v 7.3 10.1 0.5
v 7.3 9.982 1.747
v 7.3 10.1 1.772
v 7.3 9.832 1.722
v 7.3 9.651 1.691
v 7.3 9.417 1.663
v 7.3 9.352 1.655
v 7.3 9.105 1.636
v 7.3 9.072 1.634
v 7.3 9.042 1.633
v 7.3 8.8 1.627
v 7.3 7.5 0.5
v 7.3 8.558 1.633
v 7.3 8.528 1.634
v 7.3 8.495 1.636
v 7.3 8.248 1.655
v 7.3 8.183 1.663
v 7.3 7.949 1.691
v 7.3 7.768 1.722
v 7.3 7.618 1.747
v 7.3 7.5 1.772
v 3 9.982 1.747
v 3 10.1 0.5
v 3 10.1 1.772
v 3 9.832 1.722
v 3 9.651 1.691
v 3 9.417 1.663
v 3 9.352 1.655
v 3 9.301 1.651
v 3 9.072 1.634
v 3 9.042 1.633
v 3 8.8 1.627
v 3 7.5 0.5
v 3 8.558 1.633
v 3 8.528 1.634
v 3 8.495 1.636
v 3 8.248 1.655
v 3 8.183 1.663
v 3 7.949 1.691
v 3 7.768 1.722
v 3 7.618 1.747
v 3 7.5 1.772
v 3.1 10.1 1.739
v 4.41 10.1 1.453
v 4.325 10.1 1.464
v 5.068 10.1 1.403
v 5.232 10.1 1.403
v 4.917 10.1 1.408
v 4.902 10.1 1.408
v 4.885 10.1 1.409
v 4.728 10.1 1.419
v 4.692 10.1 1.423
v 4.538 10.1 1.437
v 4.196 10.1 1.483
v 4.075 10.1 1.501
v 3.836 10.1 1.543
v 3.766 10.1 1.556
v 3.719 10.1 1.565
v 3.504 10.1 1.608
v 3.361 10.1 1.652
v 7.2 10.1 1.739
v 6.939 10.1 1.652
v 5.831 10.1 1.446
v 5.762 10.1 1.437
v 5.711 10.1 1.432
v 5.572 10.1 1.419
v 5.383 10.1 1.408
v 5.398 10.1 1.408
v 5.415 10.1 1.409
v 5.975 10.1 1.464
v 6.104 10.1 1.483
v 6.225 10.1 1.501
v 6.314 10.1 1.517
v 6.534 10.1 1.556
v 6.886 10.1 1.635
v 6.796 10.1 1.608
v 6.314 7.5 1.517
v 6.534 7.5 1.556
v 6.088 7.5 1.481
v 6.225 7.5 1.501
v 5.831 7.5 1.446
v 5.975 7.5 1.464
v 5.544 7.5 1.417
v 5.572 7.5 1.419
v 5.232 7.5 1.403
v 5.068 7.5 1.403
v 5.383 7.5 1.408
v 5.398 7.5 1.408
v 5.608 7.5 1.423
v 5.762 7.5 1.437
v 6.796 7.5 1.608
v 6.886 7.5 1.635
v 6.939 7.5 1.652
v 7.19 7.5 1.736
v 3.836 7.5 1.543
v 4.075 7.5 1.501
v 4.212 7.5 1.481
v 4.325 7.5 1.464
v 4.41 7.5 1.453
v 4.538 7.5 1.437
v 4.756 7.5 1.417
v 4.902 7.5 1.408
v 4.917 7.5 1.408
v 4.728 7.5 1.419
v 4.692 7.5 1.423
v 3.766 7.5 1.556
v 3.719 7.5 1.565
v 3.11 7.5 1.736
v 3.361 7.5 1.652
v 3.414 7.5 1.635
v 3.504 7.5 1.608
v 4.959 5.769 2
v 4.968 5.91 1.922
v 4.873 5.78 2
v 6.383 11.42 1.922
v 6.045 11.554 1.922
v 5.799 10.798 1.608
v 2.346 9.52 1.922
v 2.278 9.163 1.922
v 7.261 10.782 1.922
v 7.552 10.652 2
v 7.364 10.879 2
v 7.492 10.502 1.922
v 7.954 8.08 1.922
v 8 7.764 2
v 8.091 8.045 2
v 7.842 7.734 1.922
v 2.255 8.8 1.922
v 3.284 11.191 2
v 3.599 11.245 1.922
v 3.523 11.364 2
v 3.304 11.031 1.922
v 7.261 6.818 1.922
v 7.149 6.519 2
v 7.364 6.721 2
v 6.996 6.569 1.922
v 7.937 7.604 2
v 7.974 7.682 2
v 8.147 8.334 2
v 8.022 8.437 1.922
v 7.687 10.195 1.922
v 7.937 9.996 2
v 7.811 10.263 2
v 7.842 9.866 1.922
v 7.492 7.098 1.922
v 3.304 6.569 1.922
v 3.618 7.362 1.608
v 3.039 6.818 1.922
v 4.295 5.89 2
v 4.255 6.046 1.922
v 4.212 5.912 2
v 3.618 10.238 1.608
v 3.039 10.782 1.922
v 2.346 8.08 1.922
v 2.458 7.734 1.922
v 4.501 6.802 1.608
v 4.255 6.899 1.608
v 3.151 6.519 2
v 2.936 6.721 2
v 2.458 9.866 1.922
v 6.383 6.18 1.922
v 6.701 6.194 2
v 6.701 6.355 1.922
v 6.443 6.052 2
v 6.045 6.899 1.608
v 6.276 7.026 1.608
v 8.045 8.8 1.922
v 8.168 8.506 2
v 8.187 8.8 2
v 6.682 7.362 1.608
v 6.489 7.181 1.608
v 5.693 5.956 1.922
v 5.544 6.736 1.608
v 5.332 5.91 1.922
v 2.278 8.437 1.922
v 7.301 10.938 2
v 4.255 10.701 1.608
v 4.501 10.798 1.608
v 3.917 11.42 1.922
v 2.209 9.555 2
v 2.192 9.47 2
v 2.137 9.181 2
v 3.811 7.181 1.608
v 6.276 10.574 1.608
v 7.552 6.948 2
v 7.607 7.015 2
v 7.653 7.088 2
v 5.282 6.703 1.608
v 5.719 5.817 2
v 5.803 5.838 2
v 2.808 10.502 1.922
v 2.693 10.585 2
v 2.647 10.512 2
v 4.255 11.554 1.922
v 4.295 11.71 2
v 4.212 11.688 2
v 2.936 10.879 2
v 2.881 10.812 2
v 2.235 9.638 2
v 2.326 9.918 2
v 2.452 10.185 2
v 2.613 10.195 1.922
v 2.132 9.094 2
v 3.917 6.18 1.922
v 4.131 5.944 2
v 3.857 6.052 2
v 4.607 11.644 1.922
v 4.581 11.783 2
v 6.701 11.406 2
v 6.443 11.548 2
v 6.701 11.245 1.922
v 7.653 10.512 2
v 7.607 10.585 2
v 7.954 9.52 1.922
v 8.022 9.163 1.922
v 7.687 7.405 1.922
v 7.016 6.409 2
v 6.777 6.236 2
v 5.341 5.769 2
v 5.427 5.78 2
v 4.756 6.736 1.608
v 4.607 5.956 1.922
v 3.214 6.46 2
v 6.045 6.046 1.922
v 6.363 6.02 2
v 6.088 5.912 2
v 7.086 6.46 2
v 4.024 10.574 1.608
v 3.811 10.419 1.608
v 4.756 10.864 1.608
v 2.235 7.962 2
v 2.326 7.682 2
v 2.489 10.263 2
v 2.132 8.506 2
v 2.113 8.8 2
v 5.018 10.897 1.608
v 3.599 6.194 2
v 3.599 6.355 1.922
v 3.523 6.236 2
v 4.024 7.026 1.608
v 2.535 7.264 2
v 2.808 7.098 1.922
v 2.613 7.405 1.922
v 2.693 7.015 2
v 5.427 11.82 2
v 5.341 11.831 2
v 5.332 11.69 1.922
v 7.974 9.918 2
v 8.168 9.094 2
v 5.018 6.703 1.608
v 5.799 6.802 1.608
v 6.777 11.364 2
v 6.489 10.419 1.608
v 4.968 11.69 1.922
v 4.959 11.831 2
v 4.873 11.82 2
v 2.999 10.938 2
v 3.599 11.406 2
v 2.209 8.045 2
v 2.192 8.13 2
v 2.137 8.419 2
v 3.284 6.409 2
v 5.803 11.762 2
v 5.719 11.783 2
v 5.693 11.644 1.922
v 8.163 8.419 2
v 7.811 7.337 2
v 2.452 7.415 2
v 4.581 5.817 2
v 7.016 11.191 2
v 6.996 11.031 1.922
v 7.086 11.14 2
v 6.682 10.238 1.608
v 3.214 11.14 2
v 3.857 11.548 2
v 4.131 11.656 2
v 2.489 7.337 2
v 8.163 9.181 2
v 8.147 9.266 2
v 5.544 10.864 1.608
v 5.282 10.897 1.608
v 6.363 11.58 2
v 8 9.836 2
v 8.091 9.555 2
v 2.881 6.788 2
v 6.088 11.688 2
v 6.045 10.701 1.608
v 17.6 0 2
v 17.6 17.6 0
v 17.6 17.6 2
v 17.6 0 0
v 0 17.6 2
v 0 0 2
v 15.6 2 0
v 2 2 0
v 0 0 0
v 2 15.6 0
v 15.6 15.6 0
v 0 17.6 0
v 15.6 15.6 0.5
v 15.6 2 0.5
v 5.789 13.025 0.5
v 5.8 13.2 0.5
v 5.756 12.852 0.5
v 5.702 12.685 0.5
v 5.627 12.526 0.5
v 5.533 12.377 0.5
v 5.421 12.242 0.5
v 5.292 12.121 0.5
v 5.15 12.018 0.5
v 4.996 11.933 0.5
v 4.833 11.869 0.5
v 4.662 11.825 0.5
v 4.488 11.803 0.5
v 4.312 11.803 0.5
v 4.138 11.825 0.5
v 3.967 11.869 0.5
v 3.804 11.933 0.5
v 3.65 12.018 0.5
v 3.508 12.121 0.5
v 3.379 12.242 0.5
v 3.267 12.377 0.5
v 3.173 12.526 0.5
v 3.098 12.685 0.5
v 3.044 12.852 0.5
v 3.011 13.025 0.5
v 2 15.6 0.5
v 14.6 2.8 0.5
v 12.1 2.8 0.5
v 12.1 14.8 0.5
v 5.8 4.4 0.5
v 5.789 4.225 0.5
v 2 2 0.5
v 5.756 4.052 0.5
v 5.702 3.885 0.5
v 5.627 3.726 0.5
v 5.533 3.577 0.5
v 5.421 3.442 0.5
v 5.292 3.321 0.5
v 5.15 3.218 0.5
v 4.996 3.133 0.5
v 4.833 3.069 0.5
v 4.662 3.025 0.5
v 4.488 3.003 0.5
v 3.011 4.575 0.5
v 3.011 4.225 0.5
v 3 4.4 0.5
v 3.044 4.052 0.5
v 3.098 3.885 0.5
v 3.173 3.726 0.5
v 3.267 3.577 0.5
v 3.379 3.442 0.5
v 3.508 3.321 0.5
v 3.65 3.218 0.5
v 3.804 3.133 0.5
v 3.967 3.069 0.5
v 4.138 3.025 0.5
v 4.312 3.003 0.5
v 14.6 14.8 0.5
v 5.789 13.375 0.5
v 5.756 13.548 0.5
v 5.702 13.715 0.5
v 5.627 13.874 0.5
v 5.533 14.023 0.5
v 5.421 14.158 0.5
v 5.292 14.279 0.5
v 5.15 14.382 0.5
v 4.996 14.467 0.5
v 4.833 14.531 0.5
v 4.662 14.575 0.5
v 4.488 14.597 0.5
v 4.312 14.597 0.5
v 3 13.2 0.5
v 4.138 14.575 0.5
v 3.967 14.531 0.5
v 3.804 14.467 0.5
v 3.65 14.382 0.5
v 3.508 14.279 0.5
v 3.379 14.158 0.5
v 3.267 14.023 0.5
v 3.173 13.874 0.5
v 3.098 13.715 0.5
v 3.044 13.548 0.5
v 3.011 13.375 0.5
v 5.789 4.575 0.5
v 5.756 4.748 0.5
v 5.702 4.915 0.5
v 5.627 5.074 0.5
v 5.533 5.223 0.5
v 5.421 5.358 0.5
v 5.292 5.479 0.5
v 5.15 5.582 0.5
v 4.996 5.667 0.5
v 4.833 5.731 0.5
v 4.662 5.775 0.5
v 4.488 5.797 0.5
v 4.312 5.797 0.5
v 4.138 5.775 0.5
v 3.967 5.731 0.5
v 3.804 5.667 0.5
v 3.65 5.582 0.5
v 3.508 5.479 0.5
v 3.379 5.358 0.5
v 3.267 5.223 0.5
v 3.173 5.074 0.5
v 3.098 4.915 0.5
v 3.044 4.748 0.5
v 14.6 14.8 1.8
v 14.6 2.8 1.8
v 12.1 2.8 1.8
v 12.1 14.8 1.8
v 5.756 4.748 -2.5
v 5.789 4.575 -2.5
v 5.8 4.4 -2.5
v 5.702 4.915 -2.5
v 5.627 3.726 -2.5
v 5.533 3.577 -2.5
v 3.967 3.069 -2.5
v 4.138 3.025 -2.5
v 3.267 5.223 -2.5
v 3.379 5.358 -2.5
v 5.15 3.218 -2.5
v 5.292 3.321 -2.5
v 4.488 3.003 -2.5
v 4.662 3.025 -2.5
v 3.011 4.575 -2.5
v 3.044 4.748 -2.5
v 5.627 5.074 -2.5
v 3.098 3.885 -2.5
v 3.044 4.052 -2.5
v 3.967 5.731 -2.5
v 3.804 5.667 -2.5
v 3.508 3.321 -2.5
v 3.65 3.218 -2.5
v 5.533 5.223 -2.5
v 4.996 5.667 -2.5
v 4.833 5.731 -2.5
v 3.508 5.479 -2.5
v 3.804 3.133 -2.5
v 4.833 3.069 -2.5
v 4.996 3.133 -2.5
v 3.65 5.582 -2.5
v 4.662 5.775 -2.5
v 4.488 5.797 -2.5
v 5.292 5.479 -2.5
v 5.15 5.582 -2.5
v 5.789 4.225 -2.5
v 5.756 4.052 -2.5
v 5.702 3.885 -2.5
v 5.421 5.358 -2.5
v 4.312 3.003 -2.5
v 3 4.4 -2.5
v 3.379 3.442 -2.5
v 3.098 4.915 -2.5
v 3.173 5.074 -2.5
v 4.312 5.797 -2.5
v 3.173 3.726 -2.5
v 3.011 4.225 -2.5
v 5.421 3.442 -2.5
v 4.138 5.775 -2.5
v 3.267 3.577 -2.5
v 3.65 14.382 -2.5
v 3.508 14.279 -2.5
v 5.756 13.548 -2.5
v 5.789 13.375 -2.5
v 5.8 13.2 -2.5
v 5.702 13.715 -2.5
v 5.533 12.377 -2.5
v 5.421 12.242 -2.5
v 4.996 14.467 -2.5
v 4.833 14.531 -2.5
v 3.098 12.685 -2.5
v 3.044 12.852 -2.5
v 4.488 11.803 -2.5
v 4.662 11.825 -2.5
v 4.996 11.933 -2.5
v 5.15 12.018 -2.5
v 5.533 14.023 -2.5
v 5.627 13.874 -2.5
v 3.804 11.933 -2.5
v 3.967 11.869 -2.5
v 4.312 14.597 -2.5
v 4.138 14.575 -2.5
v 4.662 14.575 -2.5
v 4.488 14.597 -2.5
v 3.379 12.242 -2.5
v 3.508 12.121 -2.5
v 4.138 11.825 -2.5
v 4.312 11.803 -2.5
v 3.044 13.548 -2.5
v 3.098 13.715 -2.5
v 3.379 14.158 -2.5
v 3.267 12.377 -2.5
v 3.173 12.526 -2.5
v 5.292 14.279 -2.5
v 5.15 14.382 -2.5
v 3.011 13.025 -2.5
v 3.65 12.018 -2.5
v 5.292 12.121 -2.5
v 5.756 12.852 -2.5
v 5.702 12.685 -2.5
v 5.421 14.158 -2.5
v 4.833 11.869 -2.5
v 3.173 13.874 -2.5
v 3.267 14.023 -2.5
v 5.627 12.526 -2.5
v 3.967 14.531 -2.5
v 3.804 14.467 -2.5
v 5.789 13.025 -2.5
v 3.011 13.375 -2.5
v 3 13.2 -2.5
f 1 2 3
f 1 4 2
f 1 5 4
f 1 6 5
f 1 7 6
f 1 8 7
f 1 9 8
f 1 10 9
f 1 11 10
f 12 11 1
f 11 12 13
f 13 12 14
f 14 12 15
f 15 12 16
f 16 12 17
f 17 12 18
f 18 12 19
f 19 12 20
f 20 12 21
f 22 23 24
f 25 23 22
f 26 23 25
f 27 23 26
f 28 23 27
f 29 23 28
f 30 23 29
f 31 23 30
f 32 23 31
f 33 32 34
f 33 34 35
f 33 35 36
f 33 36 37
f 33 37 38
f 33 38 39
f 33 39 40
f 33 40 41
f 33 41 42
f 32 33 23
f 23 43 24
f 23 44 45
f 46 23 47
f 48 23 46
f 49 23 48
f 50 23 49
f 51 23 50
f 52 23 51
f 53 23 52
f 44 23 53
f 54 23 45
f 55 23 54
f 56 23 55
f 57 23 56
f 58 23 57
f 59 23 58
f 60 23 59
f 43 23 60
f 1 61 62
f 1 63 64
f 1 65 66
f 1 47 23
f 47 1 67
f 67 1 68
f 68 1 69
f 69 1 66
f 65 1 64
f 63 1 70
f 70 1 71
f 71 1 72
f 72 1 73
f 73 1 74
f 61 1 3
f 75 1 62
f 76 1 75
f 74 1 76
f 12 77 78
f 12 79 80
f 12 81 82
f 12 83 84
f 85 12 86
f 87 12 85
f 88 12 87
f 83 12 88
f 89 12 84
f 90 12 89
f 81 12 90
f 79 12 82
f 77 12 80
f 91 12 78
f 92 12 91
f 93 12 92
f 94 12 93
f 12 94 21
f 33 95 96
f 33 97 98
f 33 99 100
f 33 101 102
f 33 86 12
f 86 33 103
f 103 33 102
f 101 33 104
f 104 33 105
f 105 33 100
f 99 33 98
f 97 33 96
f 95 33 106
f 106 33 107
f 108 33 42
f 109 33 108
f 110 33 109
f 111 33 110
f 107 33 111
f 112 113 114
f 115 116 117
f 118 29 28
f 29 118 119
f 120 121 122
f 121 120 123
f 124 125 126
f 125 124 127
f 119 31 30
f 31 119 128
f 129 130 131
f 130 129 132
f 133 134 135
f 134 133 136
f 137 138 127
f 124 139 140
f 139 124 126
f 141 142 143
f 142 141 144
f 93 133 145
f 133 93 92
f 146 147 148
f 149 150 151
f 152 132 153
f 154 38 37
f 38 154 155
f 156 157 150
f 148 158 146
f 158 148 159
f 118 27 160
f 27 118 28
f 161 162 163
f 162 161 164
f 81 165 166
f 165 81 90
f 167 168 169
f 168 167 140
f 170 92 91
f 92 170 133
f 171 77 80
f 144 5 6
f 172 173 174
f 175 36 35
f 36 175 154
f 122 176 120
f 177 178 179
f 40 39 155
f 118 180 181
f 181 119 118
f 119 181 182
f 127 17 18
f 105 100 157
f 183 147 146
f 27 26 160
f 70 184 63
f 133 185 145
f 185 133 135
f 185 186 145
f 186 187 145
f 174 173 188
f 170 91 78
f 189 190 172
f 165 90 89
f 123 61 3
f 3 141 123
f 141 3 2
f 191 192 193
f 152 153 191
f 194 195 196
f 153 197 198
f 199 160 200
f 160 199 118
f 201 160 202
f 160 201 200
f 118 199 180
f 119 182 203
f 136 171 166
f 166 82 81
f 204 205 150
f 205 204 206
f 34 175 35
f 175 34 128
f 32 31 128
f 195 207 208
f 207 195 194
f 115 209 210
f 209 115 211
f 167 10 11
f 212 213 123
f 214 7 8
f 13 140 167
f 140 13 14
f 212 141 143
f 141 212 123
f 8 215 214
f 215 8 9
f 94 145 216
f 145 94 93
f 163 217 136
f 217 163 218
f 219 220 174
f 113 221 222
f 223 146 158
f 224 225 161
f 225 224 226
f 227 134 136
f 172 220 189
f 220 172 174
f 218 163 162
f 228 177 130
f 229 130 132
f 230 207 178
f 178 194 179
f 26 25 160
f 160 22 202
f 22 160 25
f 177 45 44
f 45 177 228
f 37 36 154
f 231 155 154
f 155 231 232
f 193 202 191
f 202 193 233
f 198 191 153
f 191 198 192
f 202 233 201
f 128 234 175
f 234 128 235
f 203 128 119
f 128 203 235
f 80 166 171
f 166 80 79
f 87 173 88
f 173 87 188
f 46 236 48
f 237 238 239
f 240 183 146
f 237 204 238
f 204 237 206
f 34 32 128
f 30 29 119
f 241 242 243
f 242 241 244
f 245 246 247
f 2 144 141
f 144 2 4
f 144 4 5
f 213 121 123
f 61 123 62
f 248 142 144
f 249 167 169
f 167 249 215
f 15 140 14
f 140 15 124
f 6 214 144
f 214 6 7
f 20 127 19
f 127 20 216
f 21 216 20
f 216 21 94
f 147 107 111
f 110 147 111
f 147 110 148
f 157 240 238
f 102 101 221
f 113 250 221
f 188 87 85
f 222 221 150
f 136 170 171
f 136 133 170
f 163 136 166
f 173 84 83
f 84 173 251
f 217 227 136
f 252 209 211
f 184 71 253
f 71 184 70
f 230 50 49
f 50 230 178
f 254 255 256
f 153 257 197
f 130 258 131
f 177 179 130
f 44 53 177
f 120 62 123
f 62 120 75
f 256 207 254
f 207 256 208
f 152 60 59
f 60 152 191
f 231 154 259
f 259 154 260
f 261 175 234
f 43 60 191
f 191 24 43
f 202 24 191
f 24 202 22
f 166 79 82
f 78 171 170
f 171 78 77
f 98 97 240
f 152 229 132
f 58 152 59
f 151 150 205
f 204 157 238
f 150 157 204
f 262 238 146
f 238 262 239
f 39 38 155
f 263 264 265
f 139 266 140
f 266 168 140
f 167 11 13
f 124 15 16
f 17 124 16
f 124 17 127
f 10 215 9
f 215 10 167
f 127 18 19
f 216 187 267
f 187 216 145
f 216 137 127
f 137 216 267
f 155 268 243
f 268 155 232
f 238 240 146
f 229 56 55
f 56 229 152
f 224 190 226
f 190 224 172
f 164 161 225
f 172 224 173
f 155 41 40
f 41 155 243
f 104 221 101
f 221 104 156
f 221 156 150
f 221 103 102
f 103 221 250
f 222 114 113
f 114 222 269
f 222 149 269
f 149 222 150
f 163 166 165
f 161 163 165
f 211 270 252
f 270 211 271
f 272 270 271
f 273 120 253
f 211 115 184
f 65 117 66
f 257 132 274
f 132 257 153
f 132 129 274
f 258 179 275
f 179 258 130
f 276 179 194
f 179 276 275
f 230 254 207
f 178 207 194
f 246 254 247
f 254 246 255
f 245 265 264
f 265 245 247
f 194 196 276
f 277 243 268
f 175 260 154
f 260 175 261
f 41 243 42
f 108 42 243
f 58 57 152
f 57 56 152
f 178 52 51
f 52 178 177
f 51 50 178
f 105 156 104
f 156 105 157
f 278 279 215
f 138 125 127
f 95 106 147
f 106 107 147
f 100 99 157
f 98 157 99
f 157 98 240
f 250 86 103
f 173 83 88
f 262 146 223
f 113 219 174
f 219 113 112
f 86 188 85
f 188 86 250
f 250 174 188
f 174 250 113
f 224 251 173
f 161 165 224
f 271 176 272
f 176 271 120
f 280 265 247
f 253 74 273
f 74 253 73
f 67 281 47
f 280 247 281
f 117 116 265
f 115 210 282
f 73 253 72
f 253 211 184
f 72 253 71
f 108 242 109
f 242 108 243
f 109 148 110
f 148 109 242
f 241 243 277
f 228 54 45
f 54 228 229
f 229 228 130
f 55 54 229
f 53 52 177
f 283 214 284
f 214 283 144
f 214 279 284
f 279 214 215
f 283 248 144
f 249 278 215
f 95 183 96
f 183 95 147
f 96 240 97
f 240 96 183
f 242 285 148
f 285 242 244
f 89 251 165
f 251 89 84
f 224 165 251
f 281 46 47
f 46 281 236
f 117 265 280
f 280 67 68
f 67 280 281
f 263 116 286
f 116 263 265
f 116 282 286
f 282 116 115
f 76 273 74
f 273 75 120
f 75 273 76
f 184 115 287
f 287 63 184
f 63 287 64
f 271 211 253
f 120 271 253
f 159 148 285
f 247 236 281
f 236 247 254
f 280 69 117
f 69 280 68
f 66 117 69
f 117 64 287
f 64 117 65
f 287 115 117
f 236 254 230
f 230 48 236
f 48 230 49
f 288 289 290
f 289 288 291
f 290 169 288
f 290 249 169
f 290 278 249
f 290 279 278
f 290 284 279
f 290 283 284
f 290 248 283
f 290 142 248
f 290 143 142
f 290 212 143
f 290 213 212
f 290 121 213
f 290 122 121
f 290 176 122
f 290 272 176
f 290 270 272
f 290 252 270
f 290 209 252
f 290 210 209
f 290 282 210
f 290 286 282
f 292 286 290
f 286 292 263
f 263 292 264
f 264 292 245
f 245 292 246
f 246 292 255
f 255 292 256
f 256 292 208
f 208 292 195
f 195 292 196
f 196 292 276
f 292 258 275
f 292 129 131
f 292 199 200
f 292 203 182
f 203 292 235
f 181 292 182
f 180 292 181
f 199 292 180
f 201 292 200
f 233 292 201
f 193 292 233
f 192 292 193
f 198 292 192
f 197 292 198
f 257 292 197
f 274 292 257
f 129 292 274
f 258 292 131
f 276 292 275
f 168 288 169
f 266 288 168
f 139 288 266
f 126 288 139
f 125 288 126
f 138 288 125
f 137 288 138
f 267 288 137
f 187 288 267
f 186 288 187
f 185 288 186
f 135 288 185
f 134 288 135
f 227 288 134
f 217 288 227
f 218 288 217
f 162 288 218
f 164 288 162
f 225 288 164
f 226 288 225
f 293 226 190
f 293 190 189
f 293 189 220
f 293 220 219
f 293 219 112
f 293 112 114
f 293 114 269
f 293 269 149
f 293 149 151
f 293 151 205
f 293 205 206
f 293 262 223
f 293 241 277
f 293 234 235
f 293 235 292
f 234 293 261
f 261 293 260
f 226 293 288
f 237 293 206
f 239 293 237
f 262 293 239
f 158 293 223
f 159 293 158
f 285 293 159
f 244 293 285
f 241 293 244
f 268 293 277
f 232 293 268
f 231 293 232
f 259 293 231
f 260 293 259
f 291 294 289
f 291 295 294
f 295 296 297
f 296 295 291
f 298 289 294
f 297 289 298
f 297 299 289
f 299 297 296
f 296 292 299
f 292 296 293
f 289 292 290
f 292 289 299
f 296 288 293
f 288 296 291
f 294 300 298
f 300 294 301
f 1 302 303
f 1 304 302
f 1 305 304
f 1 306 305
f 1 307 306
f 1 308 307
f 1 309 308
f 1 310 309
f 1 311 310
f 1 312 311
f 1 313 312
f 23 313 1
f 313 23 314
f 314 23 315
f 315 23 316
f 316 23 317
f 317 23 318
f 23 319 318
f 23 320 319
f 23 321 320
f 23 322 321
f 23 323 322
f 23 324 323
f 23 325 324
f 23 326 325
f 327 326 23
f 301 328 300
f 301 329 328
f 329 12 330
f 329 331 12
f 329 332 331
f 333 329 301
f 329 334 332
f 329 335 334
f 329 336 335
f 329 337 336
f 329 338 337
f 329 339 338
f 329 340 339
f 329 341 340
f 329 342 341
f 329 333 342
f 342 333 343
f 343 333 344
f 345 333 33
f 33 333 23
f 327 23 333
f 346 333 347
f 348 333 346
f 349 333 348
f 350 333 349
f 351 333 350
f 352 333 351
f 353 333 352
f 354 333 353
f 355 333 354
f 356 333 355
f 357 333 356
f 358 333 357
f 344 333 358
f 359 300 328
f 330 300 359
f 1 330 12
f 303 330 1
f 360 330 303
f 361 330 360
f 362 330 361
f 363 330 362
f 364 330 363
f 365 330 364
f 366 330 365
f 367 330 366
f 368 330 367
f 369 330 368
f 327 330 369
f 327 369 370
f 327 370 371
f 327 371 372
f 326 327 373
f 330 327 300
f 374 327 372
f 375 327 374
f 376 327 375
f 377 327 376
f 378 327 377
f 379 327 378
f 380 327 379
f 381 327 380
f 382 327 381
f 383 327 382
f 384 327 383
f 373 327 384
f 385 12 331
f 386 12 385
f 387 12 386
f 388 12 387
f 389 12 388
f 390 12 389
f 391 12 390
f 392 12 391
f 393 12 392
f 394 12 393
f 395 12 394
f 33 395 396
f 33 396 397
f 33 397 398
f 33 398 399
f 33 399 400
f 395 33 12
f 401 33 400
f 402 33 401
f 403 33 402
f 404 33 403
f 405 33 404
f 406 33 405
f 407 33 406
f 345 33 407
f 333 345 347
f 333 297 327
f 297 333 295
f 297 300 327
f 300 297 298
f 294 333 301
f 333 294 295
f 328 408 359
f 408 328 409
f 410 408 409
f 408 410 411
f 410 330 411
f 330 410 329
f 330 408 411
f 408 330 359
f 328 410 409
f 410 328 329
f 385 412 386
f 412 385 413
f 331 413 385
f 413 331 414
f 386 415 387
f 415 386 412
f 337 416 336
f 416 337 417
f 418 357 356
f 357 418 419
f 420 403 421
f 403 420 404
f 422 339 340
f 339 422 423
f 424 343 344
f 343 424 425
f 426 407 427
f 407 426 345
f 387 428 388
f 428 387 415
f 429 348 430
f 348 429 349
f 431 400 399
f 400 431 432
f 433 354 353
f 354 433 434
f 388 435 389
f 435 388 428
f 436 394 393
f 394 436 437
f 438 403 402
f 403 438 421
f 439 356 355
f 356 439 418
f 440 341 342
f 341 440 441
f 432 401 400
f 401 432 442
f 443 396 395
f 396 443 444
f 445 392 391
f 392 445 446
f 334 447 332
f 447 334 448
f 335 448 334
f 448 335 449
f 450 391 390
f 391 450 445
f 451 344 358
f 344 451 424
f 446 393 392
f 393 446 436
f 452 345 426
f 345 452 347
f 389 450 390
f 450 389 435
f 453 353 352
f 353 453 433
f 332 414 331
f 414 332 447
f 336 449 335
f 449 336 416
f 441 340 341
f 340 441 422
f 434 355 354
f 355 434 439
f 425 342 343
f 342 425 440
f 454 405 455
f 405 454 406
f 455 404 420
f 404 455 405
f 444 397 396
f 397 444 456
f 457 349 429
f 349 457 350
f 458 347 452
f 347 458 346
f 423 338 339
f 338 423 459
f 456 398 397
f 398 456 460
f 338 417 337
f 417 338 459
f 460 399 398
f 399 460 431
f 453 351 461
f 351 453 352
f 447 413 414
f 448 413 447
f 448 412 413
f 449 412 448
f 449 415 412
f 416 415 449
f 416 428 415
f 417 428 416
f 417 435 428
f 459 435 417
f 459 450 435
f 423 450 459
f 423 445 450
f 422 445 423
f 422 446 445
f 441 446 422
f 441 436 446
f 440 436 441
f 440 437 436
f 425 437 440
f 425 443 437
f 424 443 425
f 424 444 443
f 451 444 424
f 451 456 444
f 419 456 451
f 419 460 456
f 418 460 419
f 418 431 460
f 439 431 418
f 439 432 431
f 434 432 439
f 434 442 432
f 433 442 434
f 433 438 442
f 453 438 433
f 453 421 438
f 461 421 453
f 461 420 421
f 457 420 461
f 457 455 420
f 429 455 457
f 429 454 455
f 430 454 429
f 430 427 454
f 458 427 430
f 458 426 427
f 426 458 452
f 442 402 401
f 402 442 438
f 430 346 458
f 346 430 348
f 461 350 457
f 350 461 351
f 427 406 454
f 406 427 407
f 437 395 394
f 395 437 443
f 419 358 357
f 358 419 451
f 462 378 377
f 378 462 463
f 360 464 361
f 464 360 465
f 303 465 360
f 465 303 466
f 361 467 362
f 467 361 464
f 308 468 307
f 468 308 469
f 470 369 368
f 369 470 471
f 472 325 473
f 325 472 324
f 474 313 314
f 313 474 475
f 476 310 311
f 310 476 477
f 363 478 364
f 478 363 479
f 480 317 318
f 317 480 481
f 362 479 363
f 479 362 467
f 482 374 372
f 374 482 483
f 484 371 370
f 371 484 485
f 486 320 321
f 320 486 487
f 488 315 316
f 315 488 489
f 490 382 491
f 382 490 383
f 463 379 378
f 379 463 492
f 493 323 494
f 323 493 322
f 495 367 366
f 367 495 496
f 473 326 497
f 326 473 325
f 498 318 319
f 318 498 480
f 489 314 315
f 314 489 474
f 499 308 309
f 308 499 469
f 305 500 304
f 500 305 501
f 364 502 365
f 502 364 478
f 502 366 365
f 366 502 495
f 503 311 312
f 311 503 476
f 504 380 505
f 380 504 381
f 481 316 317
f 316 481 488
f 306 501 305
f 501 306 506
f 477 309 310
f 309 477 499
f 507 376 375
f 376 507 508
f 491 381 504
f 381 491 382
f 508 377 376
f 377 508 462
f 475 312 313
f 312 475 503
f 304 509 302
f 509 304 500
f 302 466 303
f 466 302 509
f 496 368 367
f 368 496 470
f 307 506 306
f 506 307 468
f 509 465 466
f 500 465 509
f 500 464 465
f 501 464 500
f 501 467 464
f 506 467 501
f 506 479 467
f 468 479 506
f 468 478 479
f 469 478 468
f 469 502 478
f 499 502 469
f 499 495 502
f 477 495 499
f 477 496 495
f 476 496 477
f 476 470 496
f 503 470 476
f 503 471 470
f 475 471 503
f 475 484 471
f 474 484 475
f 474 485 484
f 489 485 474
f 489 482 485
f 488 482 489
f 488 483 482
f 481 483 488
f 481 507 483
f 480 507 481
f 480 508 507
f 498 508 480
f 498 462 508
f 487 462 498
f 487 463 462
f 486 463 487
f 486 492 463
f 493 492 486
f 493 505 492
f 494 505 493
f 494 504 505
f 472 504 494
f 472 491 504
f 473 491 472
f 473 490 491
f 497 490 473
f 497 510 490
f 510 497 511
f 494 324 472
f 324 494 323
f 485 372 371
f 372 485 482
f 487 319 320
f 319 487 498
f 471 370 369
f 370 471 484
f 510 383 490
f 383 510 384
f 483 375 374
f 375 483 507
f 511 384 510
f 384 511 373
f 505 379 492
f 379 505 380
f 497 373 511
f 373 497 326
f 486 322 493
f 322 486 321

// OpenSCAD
$fn = 50;

padding = 2.0;

wall_thickness = 2.0;

width = 13.6; // includes 0.1 fudge
length = 13.6;

module apds9960() {
  cutout_depth = 0.5;

  module surrounding() {
    l = length + padding * 2;
    w = width + padding * 2;
    h = wall_thickness;
    cube([l, w, h]);
  }

  module recess() {
    translate([padding, padding, 0]) {
      cube([length, width, cutout_depth]); 
    }
  }
  
  module pegs() {
    radius = 1.4;
    height = 3.0;
    translate([padding + radius + 1, padding + radius + 1, -height + cutout_depth]) {
      cylinder(height, radius * 1.0, radius);
    }
    translate([padding + radius + 1, padding + width - radius - 1, -height + cutout_depth]) {
      cylinder(height, radius * 1.0, radius);
    }
  }
 
  // For the optics of the sensor
  module cutout() {
    l = 4.3;
    w = 2.6;
    h = 1.7;
    radius = h * 4;
    translate([padding + 1, padding + width / 2 - w/2, 0]) {
      cube([l, w, wall_thickness]);
      translate([l/2, w/2, h * 0.75 + radius]) {
        sphere(radius);
      }
    }
  }
  
  module pins() {
    l = 2.5;
    w = 12.0;
    h = 1.8;
    translate([padding + length - l - 1, padding + (width - w) / 2, 0]) {
      cube([l, w, h]);
    }
  }
  
  difference() {
    surrounding();
    recess();
    cutout();
    pins();
  }
  pegs();
}

apds9960();
